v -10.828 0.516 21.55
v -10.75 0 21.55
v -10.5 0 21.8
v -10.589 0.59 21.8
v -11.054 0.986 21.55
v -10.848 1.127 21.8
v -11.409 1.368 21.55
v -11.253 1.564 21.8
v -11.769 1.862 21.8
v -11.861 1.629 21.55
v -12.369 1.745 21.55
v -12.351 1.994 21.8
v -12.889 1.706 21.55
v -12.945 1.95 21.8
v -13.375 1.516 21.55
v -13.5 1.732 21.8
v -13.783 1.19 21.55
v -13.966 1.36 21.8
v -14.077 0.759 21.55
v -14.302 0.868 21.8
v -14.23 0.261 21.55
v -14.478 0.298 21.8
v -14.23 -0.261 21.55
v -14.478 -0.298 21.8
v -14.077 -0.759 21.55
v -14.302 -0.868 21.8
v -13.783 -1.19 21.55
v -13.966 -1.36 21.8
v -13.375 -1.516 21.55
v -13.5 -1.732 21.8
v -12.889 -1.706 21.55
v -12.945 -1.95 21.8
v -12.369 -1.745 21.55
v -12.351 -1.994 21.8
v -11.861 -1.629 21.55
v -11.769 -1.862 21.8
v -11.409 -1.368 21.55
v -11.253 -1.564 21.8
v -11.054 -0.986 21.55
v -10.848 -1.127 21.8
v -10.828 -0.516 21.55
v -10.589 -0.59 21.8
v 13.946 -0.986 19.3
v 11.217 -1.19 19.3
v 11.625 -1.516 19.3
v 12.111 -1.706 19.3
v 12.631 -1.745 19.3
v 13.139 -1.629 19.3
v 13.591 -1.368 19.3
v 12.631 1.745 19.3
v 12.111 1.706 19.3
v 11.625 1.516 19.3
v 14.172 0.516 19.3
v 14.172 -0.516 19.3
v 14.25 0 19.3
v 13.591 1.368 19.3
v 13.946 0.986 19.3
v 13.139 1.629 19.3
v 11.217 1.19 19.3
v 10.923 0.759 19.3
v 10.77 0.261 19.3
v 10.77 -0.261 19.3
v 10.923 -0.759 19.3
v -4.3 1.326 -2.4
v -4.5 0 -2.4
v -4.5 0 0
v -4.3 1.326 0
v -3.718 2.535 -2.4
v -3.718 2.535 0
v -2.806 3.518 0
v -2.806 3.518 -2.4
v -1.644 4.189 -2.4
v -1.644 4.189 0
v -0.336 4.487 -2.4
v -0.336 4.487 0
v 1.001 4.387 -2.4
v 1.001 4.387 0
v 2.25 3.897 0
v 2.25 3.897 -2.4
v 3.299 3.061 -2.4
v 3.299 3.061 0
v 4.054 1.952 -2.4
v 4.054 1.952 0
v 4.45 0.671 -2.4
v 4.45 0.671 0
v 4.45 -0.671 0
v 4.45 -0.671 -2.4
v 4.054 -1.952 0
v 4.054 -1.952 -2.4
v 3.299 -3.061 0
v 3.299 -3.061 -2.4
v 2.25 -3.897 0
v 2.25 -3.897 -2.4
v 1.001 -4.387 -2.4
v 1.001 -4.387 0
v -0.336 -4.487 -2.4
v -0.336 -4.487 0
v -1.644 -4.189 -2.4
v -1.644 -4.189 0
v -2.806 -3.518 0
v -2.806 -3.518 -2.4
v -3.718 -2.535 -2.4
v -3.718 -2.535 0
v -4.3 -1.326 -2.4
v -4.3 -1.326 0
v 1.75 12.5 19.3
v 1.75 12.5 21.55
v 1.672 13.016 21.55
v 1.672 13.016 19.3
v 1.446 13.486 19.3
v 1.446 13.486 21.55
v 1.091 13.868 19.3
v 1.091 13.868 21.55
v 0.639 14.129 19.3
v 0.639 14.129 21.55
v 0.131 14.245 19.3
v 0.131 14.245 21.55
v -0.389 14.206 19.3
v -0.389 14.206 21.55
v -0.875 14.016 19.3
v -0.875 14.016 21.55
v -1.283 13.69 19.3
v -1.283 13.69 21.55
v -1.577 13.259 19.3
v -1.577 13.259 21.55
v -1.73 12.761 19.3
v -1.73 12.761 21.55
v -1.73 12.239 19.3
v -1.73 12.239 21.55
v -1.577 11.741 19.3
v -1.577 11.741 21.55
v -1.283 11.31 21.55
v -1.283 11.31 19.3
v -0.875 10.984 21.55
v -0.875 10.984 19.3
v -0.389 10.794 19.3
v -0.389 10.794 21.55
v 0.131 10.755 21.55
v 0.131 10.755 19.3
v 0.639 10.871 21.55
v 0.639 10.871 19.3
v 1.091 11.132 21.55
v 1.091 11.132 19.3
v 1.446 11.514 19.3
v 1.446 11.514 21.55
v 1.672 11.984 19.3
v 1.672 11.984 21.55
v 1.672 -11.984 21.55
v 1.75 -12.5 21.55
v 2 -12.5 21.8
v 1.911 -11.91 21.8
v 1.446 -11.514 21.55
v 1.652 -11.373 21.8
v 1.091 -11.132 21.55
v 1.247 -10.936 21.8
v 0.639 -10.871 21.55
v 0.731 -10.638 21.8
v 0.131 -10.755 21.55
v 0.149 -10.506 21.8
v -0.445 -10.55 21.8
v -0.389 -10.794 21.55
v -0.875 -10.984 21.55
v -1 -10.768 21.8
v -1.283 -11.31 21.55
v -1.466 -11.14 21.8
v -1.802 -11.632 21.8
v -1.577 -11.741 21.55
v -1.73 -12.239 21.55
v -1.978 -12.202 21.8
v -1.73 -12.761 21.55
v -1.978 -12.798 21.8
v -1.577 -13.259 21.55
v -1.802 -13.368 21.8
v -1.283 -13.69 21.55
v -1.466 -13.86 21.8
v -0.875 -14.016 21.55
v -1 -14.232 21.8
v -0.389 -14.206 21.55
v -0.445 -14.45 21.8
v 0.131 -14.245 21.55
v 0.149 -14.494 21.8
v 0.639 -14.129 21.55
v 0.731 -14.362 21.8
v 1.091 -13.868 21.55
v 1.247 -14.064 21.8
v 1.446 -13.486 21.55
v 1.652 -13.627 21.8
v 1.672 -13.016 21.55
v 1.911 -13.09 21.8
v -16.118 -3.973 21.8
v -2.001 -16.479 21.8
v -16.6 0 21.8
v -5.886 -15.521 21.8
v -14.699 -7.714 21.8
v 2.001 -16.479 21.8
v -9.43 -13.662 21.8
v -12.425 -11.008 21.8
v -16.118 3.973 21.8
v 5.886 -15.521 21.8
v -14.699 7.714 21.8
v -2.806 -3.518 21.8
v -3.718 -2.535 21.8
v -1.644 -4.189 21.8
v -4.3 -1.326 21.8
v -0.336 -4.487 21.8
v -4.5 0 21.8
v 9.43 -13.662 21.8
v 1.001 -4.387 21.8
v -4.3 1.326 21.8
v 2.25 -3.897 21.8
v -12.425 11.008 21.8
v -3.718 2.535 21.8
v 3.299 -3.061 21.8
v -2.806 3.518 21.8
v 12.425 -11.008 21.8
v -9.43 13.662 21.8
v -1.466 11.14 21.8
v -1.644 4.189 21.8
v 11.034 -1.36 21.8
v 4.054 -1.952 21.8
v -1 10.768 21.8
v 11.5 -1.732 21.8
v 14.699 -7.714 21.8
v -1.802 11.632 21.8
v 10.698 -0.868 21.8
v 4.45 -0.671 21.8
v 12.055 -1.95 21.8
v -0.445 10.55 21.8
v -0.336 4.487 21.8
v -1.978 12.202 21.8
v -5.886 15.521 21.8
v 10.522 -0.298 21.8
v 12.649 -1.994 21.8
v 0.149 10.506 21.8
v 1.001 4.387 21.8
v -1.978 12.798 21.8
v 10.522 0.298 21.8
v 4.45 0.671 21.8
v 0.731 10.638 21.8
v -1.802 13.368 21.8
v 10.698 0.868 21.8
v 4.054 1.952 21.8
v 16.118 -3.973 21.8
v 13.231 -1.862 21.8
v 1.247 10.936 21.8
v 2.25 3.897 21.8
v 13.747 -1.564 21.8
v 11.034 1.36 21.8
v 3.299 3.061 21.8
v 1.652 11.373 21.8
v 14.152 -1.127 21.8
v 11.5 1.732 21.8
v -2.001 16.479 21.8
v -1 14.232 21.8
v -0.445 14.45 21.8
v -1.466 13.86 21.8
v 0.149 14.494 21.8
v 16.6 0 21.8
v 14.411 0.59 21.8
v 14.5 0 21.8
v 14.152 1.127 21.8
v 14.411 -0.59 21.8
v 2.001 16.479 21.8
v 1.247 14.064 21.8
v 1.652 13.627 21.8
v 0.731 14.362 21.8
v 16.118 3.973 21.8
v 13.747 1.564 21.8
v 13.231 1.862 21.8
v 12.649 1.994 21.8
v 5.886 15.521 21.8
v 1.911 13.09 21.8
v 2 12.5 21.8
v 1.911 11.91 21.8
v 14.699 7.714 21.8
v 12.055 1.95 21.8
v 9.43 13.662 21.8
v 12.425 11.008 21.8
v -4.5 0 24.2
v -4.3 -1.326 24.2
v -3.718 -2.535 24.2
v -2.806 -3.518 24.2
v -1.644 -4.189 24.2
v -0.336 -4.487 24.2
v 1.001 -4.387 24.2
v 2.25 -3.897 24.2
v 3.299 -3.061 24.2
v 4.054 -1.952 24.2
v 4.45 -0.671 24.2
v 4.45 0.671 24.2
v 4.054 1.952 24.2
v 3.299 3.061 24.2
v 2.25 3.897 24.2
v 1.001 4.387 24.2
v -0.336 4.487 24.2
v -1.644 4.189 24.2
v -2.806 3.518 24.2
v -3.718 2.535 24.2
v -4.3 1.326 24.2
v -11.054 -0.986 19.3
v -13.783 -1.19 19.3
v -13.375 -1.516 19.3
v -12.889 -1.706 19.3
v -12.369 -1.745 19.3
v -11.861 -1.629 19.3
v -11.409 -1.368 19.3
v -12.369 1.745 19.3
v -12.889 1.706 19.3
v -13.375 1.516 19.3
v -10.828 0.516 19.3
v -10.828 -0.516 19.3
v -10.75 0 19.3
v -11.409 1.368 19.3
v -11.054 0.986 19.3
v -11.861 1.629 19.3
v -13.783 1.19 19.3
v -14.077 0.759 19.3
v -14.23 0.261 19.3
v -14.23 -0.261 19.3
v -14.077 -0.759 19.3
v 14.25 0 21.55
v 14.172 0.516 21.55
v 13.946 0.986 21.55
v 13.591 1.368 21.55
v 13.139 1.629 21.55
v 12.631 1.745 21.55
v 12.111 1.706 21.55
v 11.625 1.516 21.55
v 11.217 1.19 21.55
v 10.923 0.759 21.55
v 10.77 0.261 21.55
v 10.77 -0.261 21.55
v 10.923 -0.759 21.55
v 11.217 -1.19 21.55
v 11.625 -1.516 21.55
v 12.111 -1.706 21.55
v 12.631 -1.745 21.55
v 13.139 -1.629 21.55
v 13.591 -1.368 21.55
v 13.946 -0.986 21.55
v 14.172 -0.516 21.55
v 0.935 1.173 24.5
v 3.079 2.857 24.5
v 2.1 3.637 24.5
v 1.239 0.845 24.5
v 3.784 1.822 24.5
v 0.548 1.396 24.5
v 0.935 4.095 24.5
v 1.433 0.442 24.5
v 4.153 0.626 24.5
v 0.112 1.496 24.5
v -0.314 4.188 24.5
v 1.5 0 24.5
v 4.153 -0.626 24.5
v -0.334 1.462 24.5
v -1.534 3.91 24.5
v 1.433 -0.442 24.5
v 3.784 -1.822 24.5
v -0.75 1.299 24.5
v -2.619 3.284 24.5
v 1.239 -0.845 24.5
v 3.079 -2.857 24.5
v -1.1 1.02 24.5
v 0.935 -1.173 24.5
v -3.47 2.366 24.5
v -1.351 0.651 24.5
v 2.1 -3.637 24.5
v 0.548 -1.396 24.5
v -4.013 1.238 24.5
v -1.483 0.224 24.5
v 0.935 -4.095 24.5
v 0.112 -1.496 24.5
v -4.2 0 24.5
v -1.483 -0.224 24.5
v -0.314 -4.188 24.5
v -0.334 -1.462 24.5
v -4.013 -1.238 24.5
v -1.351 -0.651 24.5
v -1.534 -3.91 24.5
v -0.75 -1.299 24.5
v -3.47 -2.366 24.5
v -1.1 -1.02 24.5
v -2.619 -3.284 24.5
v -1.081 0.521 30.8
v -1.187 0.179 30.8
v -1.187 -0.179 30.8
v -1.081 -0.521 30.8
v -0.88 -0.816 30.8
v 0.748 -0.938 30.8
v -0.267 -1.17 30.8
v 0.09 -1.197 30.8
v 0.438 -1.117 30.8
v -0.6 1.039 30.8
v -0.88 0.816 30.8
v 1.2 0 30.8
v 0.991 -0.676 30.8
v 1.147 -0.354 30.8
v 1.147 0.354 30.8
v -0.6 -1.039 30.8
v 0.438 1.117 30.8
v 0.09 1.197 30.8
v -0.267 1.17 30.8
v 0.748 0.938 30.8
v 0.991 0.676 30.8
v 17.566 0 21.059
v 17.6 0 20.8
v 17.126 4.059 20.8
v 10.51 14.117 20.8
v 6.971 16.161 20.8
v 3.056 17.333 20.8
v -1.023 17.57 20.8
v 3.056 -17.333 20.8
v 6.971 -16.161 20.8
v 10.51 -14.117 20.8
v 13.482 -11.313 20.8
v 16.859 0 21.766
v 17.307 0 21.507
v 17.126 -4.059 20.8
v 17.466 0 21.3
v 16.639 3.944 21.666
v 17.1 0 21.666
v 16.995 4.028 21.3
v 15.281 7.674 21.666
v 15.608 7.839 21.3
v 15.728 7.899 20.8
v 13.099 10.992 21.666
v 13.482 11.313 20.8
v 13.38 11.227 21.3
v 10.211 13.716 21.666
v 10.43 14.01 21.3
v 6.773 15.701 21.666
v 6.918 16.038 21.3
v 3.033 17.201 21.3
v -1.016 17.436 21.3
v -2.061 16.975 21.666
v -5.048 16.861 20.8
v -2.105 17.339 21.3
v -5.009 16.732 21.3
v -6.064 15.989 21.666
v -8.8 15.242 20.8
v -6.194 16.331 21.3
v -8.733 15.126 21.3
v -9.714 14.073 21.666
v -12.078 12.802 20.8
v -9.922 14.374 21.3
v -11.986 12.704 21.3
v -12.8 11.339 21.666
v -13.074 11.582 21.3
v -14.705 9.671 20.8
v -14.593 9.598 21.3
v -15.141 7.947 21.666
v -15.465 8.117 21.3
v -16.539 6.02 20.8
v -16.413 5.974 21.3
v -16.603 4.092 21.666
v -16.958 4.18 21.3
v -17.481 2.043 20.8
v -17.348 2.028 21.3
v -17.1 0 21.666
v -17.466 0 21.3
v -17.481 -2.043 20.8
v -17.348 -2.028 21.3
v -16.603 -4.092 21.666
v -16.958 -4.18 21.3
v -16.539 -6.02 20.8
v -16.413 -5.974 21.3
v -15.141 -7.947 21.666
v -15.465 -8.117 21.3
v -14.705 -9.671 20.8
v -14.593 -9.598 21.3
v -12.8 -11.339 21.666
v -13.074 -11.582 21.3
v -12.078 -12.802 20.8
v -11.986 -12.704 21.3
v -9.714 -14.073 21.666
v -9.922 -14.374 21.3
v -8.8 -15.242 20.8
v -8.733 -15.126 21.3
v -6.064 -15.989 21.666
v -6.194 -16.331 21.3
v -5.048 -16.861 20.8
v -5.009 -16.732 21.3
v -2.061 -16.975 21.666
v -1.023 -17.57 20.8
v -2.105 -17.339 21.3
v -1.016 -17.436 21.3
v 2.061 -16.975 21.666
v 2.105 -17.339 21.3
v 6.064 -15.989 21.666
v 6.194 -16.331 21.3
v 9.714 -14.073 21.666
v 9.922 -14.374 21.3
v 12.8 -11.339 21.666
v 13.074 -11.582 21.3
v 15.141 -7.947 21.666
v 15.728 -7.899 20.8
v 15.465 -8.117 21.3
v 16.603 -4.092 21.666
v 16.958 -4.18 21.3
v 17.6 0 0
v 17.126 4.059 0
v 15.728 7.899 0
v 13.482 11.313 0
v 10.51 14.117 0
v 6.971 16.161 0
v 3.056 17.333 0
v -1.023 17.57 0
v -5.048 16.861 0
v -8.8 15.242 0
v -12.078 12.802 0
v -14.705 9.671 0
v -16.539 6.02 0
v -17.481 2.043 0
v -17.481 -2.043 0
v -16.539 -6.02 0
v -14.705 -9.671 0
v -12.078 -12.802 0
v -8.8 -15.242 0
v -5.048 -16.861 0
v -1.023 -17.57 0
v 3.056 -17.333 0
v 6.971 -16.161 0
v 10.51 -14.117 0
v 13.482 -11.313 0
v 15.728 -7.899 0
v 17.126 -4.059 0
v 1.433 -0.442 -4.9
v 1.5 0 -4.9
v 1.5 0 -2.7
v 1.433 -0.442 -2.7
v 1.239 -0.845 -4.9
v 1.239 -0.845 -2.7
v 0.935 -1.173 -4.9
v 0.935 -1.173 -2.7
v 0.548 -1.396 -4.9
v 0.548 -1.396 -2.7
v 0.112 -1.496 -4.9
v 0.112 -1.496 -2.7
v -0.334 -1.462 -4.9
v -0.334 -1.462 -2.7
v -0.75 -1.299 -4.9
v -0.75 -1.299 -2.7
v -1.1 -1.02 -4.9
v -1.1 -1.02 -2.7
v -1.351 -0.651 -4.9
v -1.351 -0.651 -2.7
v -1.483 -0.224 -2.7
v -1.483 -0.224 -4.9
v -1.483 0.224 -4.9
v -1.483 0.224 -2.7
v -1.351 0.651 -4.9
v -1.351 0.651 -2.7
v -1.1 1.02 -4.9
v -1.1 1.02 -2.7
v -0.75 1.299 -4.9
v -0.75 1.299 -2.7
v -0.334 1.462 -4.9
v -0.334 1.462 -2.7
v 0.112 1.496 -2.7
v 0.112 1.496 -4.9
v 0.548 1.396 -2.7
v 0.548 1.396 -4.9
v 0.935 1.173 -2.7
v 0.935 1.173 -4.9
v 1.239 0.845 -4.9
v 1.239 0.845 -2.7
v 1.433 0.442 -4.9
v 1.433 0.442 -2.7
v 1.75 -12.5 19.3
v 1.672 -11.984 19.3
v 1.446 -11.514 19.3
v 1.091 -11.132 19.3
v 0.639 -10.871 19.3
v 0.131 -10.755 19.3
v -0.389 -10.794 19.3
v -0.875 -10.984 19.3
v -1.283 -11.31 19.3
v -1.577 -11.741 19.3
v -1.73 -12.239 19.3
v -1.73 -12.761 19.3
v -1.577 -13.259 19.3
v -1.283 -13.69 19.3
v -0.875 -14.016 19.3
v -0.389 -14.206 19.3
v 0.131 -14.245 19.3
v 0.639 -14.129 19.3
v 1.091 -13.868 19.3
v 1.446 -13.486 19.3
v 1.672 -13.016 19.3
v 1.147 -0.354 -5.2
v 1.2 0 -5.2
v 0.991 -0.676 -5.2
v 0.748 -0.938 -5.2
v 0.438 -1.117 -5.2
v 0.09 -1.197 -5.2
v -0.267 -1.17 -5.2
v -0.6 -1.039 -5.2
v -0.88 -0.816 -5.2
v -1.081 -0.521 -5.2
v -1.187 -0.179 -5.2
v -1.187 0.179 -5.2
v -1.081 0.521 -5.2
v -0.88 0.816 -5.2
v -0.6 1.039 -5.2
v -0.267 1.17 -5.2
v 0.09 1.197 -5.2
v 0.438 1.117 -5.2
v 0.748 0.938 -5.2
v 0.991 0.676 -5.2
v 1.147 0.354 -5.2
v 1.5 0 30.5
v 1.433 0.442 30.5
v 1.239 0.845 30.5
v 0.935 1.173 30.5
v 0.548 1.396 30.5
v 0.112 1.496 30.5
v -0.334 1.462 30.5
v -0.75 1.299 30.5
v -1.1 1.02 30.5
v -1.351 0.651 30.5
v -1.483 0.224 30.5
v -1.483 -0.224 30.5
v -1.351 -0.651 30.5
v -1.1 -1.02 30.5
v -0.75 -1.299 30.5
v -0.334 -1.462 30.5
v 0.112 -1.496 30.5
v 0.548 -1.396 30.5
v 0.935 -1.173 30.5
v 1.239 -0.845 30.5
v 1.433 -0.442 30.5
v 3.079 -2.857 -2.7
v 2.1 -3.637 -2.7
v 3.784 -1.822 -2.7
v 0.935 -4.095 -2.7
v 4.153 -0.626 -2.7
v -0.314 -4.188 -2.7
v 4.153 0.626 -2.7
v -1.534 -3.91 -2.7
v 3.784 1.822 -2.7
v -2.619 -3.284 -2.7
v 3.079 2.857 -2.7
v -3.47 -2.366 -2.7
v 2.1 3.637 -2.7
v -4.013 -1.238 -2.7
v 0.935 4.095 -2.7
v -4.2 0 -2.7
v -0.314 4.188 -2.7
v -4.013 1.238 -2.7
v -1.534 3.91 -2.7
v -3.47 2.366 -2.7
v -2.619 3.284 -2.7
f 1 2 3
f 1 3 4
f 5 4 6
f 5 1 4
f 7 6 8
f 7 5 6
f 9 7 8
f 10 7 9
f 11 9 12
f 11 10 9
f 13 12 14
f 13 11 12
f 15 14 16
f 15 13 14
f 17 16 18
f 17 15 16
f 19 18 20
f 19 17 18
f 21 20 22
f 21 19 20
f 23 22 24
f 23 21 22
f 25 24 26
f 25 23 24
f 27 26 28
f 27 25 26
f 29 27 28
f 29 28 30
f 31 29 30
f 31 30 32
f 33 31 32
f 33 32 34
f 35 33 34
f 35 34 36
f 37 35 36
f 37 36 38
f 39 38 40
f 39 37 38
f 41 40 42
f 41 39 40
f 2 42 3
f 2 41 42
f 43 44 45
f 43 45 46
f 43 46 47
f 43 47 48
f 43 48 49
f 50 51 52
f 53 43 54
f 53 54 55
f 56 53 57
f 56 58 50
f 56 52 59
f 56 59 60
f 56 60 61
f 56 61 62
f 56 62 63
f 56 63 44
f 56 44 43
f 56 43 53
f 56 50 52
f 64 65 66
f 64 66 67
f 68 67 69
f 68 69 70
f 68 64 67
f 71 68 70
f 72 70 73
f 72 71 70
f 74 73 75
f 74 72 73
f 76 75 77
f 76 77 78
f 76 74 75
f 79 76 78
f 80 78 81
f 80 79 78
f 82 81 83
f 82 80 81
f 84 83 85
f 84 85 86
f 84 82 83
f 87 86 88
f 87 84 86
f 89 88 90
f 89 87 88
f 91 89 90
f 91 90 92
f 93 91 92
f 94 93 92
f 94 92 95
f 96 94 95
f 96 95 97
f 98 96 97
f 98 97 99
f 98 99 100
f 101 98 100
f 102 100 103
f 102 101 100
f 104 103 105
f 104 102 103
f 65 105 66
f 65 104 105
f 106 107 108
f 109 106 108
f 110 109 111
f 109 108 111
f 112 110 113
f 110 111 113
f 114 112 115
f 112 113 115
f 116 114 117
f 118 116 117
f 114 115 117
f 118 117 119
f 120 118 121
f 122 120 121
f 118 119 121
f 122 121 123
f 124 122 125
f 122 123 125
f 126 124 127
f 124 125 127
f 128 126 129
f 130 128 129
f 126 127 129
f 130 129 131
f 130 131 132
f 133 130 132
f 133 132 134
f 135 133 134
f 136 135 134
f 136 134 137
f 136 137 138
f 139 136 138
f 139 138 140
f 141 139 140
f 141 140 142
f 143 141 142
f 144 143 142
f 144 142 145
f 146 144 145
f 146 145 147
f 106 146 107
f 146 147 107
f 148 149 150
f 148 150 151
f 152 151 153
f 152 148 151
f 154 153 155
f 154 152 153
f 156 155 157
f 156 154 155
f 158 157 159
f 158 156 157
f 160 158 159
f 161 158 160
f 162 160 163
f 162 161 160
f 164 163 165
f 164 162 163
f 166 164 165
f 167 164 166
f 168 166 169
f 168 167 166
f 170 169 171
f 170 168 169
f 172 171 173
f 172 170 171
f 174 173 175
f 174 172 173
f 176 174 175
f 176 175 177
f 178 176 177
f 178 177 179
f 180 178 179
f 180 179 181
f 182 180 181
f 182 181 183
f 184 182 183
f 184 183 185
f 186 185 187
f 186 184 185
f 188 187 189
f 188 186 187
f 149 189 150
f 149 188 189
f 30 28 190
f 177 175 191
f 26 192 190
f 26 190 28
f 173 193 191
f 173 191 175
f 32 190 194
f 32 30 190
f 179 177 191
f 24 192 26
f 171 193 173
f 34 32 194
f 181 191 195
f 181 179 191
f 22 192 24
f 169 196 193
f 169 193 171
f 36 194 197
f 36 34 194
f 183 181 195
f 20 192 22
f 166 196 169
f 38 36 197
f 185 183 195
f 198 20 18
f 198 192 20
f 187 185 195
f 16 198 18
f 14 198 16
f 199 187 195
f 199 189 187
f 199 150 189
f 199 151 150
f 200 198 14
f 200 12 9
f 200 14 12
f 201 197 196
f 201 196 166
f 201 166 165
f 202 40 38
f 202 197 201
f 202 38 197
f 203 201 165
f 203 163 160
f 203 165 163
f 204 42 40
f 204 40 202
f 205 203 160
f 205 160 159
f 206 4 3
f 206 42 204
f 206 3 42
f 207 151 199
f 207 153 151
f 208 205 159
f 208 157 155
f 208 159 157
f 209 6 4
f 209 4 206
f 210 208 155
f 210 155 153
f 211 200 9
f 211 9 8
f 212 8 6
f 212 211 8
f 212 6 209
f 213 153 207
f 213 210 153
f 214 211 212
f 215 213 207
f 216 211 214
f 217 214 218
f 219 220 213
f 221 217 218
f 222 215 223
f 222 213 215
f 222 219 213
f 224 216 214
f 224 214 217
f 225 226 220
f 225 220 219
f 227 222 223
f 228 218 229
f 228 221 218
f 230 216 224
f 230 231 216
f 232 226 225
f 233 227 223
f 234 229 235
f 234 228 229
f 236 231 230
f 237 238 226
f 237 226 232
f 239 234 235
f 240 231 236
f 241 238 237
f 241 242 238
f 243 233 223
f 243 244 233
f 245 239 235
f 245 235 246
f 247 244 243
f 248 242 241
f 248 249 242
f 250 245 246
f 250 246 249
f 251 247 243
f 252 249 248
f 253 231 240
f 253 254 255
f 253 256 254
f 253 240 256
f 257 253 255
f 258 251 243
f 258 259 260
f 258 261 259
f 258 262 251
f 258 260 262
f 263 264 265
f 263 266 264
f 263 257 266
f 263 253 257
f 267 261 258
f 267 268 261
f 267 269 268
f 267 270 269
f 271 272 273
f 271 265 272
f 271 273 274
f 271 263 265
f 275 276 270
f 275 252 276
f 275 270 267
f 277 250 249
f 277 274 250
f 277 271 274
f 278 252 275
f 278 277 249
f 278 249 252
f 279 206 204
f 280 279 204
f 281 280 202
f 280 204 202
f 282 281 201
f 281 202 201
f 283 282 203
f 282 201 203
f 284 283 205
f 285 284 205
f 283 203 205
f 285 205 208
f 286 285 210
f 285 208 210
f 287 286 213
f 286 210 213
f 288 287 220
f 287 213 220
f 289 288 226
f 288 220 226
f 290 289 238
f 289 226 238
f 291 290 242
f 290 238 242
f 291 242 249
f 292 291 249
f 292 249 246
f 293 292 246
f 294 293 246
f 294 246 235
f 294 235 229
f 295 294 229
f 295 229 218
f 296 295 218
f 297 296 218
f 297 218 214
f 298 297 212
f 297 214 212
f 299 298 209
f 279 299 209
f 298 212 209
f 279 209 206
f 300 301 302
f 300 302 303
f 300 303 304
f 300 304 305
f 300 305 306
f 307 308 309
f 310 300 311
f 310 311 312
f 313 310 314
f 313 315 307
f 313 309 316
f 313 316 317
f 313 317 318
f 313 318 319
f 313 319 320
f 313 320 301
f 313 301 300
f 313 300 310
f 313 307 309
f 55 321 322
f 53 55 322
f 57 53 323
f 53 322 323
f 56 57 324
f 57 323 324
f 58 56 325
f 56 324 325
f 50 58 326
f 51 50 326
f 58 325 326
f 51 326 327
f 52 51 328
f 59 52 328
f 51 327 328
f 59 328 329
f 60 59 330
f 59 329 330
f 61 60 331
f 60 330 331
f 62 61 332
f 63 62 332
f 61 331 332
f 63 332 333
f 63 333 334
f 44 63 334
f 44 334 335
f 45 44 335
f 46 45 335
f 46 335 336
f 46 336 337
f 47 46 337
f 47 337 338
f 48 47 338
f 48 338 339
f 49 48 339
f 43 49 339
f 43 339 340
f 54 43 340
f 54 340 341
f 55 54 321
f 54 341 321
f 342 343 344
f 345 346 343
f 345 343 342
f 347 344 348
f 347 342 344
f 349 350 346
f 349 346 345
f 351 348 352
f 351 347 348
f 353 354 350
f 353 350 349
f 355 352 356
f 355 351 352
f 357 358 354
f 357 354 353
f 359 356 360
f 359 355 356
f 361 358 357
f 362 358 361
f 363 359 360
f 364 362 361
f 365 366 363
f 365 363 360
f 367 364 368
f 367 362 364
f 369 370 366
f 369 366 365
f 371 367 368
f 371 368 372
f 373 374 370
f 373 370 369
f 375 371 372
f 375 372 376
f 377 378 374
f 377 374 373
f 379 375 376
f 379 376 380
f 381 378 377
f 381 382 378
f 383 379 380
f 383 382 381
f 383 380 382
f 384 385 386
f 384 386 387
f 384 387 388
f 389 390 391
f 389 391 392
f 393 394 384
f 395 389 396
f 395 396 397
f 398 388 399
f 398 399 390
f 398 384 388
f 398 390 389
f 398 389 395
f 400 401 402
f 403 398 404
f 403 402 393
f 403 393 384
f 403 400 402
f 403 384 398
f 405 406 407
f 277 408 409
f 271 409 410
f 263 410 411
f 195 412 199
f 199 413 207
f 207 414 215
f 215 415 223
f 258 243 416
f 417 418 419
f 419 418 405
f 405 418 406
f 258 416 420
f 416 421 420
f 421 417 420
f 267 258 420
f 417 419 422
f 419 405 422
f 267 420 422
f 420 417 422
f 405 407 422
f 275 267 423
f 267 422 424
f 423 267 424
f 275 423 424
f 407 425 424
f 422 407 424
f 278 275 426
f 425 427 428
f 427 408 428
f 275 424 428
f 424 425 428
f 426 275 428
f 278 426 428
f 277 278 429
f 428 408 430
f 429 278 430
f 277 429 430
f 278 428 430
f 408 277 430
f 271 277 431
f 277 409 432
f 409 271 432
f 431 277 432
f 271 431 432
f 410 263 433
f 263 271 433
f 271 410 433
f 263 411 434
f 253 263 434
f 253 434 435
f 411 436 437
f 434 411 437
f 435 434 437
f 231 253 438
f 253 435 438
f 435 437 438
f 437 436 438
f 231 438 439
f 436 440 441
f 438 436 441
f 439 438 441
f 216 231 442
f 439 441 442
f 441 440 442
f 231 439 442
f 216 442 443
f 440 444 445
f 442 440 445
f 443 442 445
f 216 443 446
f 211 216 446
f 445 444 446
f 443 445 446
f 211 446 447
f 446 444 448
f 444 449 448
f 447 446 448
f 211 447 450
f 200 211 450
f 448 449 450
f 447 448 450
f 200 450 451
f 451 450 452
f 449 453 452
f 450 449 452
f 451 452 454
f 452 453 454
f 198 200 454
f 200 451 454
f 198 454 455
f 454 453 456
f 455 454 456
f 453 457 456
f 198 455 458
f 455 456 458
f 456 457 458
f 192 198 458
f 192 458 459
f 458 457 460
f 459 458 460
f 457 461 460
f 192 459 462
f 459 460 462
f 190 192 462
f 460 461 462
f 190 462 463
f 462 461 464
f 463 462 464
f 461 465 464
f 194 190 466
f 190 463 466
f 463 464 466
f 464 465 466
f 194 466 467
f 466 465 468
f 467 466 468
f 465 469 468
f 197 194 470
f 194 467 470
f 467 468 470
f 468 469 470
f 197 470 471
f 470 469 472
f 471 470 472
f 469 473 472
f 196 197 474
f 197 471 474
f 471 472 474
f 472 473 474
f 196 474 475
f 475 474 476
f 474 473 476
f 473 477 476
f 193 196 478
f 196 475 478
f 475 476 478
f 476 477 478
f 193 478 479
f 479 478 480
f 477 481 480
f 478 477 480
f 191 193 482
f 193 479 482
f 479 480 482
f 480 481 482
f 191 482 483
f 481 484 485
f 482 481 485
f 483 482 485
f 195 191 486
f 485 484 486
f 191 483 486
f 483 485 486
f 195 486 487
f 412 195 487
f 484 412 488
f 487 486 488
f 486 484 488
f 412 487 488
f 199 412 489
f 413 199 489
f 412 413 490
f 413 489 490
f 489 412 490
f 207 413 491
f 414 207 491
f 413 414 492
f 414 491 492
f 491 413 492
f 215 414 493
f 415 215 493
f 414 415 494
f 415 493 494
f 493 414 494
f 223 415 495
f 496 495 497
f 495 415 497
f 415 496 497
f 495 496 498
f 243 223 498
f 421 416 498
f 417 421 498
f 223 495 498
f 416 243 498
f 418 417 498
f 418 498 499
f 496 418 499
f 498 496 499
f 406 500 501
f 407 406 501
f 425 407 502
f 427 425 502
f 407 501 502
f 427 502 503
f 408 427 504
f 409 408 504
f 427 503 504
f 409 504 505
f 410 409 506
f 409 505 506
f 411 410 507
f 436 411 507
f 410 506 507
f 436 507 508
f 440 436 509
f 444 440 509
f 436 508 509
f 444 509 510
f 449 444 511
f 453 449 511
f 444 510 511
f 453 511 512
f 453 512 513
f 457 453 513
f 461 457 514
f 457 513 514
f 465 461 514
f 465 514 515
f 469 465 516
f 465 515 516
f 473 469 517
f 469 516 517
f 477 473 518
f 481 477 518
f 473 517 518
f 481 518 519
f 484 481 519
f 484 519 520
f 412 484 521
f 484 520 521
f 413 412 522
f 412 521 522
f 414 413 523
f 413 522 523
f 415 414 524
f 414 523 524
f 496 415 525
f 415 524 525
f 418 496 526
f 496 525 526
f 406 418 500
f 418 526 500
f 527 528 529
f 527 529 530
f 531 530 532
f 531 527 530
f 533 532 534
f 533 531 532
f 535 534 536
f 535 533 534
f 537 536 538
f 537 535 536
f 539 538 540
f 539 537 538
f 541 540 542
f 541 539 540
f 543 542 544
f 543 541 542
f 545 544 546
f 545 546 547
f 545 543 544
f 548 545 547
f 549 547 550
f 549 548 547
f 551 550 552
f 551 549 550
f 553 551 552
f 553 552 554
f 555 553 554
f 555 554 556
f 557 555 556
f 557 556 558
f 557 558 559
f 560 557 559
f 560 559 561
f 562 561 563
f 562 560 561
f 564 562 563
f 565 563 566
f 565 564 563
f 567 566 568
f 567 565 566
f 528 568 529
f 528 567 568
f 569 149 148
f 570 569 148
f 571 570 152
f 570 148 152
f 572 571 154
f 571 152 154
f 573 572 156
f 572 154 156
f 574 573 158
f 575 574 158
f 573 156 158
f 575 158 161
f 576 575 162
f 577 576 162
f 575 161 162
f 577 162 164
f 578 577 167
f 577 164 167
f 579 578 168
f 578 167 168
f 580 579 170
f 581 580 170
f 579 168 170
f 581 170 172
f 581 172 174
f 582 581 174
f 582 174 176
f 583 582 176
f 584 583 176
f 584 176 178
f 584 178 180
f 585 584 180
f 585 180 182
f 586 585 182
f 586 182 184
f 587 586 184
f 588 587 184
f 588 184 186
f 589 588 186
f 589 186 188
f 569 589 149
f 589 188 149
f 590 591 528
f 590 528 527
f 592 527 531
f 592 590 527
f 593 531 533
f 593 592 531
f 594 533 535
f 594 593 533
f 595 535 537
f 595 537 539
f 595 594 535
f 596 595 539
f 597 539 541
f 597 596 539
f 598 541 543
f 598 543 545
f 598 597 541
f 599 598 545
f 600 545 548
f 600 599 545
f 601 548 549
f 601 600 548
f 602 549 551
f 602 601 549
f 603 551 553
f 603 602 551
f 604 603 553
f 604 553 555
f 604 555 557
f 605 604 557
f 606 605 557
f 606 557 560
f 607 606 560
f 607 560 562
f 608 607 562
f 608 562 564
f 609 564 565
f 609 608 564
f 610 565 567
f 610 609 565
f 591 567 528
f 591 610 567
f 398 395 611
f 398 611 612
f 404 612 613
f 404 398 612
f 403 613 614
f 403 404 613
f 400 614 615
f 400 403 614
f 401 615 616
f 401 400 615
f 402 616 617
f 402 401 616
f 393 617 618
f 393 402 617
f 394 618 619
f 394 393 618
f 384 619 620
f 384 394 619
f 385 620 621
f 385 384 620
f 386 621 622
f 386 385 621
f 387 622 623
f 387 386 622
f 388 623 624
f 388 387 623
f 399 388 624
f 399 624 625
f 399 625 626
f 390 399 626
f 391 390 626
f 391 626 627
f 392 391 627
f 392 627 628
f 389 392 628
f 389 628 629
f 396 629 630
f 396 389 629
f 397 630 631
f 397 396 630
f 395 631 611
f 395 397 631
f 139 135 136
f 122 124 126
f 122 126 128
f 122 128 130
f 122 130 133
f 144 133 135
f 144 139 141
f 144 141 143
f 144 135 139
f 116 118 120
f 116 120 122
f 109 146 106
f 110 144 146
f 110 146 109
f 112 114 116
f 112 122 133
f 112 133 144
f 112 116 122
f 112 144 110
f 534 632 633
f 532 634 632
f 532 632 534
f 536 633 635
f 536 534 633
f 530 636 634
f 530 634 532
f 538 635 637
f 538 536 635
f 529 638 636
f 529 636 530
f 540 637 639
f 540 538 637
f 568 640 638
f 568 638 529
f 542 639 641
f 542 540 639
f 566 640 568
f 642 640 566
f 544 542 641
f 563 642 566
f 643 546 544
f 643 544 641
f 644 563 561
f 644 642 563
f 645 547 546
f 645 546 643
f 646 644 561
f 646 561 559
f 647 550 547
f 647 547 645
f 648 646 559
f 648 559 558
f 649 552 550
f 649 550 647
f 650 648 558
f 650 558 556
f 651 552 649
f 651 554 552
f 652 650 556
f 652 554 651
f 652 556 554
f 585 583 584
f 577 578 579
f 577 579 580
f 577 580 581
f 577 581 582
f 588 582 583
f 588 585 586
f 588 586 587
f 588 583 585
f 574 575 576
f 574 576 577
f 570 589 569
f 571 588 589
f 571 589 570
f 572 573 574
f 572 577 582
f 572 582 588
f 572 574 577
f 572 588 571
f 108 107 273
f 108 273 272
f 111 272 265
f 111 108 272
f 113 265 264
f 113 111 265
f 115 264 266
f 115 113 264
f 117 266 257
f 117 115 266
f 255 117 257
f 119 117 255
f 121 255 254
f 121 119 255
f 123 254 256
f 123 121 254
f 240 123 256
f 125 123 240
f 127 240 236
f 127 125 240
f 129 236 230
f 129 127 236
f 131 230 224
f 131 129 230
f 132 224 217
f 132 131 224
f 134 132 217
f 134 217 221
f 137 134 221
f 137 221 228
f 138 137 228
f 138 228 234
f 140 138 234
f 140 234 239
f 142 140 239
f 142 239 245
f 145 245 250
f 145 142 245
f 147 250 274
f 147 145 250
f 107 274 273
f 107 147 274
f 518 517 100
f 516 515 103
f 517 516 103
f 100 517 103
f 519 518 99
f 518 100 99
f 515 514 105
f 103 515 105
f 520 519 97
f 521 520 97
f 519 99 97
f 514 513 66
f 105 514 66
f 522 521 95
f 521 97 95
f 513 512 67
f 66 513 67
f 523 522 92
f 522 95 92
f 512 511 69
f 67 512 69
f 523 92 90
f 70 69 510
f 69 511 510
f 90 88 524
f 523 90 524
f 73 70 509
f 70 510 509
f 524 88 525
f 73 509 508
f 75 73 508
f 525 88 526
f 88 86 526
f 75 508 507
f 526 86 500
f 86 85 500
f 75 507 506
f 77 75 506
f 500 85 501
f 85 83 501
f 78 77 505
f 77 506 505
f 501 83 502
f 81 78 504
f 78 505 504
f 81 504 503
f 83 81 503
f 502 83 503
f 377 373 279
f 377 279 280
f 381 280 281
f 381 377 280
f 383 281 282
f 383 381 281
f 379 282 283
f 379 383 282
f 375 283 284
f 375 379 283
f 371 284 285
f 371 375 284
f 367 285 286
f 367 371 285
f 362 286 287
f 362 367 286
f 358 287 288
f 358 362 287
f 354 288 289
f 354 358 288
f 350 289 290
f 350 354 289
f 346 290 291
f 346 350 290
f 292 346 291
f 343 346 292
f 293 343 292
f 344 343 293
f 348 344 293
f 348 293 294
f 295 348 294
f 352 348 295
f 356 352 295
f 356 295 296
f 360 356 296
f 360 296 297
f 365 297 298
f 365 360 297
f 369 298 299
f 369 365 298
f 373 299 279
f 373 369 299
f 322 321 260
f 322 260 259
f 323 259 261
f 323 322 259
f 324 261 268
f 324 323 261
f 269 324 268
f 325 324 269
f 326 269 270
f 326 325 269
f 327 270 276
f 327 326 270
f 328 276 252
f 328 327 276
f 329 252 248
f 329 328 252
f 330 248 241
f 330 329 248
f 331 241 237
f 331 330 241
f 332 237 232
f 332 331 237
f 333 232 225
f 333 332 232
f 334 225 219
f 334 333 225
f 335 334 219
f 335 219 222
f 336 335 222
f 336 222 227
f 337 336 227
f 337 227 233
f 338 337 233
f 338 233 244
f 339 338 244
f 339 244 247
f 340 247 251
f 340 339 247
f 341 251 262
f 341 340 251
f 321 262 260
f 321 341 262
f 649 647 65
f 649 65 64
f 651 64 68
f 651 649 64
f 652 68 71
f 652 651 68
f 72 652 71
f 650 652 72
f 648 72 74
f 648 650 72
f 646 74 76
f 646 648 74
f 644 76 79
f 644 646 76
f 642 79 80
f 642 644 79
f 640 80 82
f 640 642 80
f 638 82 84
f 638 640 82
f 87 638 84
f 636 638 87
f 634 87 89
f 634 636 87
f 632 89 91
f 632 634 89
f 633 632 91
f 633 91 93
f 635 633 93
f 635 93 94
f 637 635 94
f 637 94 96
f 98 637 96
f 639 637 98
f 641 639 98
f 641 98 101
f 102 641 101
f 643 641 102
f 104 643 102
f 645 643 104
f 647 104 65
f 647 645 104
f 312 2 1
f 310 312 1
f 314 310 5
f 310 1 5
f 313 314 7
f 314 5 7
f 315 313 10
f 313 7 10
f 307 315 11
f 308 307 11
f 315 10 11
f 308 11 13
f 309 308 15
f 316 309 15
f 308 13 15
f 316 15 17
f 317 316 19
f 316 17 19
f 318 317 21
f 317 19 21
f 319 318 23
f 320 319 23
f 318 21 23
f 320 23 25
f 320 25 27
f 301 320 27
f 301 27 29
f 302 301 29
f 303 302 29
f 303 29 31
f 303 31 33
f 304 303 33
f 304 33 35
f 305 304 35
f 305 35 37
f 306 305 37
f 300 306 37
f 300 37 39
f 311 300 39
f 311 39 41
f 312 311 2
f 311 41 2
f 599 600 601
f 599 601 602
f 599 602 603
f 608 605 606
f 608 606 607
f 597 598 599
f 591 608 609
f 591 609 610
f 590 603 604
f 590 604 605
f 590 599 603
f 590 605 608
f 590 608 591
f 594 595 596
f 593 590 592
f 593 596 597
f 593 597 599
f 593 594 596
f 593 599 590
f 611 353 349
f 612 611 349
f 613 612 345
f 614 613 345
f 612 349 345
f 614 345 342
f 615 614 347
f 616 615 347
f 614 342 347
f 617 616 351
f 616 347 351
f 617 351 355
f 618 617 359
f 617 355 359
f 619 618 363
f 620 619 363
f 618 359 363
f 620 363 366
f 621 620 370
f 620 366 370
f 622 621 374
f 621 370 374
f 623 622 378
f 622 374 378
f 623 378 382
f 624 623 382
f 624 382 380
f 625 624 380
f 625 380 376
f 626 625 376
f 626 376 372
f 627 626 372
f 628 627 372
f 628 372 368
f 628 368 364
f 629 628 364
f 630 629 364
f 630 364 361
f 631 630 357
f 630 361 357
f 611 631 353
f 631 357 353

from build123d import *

# Parameters (mm, degrees)
SKETCH1_R           = 17.6
BOSS_EXTRUDE1_DEPTH = 21.8
SKETCH2_R           = 4.5
BOSS_EXTRUDE2_DEPTH = 2.7
SKETCH3_R           = 1.5
BOSS_EXTRUDE3_DEPTH = 6.3
BOSS_EXTRUDE4_START = 2.7
SKETCH4_R           = 4.5
BOSS_EXTRUDE4_DEPTH = 2.7
BOSS_EXTRUDE5_START = 2.5
SKETCH5_R           = 1.5
BOSS_EXTRUDE5_DEPTH = 2.5
SKETCH6_R           = 1.75
CUT_EXTRUDE1_DEPTH  = 2.5
CHAMFER1_SIZE       = 0.25
CHAMFER2_SIZE       = 0.3
FILLET1_R           = 1
CHAMFER3_SIZE       = 0.3


with BuildPart() as part:
    # Sketch1 → Boss-Extrude1 (new body)
    with BuildSketch(Plane.XY):
        Circle(SKETCH1_R)
    extrude(amount=BOSS_EXTRUDE1_DEPTH)

    # Sketch2 → Boss-Extrude2 (add)
    with BuildSketch(Plane.XY.offset(21.8)):
        with Locations(Location((0, 0, 0), (0, 0, 180))):
            Circle(SKETCH2_R)
    extrude(amount=BOSS_EXTRUDE2_DEPTH)

    # Sketch3 → Boss-Extrude3 (add)
    with BuildSketch(Plane.XY.offset(24.5)):
        Circle(SKETCH3_R)
    extrude(amount=BOSS_EXTRUDE3_DEPTH)

    # Sketch4 → Boss-Extrude4 (add)
    with BuildSketch(Plane(origin=(0, 0, 0), x_dir=(-1, 0, 0), z_dir=(0, 0, -1)).offset(BOSS_EXTRUDE4_START)):
        Circle(SKETCH4_R)
    extrude(amount=-BOSS_EXTRUDE4_DEPTH)

    # Sketch5 → Boss-Extrude5 (add)
    with BuildSketch(Plane(origin=(0, 0, -2.7), x_dir=(-1, 0, 0), z_dir=(0, 0, -1)).offset(BOSS_EXTRUDE5_START)):
        with Locations(Location((0, 0, 0), (0, 0, 180))):
            Circle(SKETCH5_R)
    extrude(amount=-BOSS_EXTRUDE5_DEPTH)

    # Sketch6 → Cut-Extrude1 (cut)
    with BuildSketch(Plane.XY.offset(21.8)):
        with Locations((0, 12.5)):
            Circle(SKETCH6_R)
        with Locations((12.5, 0)):
            Circle(SKETCH6_R)
        with Locations((0, -12.5)):
            Circle(SKETCH6_R)
        with Locations((-12.5, 0)):
            Circle(SKETCH6_R)
    extrude(amount=-CUT_EXTRUDE1_DEPTH, mode=Mode.SUBTRACT)

    # Chamfer1
    chamfer1_edges = [part.edges().sort_by_distance(p)[0] for p in [
        (-1.75, 12.5, 21.8),
        (10.75, 0, 21.8),
        (-1.75, -12.5, 21.8),
        (-14.25, 0, 21.8),
    ]]
    chamfer(chamfer1_edges, length=CHAMFER1_SIZE)

    # Chamfer2
    chamfer2_edges = [part.edges().sort_by_distance(p)[0] for p in [
        (4.5, 0, -2.7),
        (4.5, 0, 24.5),
    ]]
    chamfer(chamfer2_edges, length=CHAMFER2_SIZE)

    # Fillet1
    fillet1_edges = [part.edges().sort_by_distance(p)[0] for p in [
        (-17.6, 0, 21.8),
    ]]
    fillet(fillet1_edges, radius=FILLET1_R)

    # Chamfer3
    chamfer3_edges = [part.edges().sort_by_distance(p)[0] for p in [
        (-1.5, 0, 30.8),
        (-1.5, 0, -5.2),
    ]]
    chamfer(chamfer3_edges, length=CHAMFER3_SIZE)


solid = part.part
